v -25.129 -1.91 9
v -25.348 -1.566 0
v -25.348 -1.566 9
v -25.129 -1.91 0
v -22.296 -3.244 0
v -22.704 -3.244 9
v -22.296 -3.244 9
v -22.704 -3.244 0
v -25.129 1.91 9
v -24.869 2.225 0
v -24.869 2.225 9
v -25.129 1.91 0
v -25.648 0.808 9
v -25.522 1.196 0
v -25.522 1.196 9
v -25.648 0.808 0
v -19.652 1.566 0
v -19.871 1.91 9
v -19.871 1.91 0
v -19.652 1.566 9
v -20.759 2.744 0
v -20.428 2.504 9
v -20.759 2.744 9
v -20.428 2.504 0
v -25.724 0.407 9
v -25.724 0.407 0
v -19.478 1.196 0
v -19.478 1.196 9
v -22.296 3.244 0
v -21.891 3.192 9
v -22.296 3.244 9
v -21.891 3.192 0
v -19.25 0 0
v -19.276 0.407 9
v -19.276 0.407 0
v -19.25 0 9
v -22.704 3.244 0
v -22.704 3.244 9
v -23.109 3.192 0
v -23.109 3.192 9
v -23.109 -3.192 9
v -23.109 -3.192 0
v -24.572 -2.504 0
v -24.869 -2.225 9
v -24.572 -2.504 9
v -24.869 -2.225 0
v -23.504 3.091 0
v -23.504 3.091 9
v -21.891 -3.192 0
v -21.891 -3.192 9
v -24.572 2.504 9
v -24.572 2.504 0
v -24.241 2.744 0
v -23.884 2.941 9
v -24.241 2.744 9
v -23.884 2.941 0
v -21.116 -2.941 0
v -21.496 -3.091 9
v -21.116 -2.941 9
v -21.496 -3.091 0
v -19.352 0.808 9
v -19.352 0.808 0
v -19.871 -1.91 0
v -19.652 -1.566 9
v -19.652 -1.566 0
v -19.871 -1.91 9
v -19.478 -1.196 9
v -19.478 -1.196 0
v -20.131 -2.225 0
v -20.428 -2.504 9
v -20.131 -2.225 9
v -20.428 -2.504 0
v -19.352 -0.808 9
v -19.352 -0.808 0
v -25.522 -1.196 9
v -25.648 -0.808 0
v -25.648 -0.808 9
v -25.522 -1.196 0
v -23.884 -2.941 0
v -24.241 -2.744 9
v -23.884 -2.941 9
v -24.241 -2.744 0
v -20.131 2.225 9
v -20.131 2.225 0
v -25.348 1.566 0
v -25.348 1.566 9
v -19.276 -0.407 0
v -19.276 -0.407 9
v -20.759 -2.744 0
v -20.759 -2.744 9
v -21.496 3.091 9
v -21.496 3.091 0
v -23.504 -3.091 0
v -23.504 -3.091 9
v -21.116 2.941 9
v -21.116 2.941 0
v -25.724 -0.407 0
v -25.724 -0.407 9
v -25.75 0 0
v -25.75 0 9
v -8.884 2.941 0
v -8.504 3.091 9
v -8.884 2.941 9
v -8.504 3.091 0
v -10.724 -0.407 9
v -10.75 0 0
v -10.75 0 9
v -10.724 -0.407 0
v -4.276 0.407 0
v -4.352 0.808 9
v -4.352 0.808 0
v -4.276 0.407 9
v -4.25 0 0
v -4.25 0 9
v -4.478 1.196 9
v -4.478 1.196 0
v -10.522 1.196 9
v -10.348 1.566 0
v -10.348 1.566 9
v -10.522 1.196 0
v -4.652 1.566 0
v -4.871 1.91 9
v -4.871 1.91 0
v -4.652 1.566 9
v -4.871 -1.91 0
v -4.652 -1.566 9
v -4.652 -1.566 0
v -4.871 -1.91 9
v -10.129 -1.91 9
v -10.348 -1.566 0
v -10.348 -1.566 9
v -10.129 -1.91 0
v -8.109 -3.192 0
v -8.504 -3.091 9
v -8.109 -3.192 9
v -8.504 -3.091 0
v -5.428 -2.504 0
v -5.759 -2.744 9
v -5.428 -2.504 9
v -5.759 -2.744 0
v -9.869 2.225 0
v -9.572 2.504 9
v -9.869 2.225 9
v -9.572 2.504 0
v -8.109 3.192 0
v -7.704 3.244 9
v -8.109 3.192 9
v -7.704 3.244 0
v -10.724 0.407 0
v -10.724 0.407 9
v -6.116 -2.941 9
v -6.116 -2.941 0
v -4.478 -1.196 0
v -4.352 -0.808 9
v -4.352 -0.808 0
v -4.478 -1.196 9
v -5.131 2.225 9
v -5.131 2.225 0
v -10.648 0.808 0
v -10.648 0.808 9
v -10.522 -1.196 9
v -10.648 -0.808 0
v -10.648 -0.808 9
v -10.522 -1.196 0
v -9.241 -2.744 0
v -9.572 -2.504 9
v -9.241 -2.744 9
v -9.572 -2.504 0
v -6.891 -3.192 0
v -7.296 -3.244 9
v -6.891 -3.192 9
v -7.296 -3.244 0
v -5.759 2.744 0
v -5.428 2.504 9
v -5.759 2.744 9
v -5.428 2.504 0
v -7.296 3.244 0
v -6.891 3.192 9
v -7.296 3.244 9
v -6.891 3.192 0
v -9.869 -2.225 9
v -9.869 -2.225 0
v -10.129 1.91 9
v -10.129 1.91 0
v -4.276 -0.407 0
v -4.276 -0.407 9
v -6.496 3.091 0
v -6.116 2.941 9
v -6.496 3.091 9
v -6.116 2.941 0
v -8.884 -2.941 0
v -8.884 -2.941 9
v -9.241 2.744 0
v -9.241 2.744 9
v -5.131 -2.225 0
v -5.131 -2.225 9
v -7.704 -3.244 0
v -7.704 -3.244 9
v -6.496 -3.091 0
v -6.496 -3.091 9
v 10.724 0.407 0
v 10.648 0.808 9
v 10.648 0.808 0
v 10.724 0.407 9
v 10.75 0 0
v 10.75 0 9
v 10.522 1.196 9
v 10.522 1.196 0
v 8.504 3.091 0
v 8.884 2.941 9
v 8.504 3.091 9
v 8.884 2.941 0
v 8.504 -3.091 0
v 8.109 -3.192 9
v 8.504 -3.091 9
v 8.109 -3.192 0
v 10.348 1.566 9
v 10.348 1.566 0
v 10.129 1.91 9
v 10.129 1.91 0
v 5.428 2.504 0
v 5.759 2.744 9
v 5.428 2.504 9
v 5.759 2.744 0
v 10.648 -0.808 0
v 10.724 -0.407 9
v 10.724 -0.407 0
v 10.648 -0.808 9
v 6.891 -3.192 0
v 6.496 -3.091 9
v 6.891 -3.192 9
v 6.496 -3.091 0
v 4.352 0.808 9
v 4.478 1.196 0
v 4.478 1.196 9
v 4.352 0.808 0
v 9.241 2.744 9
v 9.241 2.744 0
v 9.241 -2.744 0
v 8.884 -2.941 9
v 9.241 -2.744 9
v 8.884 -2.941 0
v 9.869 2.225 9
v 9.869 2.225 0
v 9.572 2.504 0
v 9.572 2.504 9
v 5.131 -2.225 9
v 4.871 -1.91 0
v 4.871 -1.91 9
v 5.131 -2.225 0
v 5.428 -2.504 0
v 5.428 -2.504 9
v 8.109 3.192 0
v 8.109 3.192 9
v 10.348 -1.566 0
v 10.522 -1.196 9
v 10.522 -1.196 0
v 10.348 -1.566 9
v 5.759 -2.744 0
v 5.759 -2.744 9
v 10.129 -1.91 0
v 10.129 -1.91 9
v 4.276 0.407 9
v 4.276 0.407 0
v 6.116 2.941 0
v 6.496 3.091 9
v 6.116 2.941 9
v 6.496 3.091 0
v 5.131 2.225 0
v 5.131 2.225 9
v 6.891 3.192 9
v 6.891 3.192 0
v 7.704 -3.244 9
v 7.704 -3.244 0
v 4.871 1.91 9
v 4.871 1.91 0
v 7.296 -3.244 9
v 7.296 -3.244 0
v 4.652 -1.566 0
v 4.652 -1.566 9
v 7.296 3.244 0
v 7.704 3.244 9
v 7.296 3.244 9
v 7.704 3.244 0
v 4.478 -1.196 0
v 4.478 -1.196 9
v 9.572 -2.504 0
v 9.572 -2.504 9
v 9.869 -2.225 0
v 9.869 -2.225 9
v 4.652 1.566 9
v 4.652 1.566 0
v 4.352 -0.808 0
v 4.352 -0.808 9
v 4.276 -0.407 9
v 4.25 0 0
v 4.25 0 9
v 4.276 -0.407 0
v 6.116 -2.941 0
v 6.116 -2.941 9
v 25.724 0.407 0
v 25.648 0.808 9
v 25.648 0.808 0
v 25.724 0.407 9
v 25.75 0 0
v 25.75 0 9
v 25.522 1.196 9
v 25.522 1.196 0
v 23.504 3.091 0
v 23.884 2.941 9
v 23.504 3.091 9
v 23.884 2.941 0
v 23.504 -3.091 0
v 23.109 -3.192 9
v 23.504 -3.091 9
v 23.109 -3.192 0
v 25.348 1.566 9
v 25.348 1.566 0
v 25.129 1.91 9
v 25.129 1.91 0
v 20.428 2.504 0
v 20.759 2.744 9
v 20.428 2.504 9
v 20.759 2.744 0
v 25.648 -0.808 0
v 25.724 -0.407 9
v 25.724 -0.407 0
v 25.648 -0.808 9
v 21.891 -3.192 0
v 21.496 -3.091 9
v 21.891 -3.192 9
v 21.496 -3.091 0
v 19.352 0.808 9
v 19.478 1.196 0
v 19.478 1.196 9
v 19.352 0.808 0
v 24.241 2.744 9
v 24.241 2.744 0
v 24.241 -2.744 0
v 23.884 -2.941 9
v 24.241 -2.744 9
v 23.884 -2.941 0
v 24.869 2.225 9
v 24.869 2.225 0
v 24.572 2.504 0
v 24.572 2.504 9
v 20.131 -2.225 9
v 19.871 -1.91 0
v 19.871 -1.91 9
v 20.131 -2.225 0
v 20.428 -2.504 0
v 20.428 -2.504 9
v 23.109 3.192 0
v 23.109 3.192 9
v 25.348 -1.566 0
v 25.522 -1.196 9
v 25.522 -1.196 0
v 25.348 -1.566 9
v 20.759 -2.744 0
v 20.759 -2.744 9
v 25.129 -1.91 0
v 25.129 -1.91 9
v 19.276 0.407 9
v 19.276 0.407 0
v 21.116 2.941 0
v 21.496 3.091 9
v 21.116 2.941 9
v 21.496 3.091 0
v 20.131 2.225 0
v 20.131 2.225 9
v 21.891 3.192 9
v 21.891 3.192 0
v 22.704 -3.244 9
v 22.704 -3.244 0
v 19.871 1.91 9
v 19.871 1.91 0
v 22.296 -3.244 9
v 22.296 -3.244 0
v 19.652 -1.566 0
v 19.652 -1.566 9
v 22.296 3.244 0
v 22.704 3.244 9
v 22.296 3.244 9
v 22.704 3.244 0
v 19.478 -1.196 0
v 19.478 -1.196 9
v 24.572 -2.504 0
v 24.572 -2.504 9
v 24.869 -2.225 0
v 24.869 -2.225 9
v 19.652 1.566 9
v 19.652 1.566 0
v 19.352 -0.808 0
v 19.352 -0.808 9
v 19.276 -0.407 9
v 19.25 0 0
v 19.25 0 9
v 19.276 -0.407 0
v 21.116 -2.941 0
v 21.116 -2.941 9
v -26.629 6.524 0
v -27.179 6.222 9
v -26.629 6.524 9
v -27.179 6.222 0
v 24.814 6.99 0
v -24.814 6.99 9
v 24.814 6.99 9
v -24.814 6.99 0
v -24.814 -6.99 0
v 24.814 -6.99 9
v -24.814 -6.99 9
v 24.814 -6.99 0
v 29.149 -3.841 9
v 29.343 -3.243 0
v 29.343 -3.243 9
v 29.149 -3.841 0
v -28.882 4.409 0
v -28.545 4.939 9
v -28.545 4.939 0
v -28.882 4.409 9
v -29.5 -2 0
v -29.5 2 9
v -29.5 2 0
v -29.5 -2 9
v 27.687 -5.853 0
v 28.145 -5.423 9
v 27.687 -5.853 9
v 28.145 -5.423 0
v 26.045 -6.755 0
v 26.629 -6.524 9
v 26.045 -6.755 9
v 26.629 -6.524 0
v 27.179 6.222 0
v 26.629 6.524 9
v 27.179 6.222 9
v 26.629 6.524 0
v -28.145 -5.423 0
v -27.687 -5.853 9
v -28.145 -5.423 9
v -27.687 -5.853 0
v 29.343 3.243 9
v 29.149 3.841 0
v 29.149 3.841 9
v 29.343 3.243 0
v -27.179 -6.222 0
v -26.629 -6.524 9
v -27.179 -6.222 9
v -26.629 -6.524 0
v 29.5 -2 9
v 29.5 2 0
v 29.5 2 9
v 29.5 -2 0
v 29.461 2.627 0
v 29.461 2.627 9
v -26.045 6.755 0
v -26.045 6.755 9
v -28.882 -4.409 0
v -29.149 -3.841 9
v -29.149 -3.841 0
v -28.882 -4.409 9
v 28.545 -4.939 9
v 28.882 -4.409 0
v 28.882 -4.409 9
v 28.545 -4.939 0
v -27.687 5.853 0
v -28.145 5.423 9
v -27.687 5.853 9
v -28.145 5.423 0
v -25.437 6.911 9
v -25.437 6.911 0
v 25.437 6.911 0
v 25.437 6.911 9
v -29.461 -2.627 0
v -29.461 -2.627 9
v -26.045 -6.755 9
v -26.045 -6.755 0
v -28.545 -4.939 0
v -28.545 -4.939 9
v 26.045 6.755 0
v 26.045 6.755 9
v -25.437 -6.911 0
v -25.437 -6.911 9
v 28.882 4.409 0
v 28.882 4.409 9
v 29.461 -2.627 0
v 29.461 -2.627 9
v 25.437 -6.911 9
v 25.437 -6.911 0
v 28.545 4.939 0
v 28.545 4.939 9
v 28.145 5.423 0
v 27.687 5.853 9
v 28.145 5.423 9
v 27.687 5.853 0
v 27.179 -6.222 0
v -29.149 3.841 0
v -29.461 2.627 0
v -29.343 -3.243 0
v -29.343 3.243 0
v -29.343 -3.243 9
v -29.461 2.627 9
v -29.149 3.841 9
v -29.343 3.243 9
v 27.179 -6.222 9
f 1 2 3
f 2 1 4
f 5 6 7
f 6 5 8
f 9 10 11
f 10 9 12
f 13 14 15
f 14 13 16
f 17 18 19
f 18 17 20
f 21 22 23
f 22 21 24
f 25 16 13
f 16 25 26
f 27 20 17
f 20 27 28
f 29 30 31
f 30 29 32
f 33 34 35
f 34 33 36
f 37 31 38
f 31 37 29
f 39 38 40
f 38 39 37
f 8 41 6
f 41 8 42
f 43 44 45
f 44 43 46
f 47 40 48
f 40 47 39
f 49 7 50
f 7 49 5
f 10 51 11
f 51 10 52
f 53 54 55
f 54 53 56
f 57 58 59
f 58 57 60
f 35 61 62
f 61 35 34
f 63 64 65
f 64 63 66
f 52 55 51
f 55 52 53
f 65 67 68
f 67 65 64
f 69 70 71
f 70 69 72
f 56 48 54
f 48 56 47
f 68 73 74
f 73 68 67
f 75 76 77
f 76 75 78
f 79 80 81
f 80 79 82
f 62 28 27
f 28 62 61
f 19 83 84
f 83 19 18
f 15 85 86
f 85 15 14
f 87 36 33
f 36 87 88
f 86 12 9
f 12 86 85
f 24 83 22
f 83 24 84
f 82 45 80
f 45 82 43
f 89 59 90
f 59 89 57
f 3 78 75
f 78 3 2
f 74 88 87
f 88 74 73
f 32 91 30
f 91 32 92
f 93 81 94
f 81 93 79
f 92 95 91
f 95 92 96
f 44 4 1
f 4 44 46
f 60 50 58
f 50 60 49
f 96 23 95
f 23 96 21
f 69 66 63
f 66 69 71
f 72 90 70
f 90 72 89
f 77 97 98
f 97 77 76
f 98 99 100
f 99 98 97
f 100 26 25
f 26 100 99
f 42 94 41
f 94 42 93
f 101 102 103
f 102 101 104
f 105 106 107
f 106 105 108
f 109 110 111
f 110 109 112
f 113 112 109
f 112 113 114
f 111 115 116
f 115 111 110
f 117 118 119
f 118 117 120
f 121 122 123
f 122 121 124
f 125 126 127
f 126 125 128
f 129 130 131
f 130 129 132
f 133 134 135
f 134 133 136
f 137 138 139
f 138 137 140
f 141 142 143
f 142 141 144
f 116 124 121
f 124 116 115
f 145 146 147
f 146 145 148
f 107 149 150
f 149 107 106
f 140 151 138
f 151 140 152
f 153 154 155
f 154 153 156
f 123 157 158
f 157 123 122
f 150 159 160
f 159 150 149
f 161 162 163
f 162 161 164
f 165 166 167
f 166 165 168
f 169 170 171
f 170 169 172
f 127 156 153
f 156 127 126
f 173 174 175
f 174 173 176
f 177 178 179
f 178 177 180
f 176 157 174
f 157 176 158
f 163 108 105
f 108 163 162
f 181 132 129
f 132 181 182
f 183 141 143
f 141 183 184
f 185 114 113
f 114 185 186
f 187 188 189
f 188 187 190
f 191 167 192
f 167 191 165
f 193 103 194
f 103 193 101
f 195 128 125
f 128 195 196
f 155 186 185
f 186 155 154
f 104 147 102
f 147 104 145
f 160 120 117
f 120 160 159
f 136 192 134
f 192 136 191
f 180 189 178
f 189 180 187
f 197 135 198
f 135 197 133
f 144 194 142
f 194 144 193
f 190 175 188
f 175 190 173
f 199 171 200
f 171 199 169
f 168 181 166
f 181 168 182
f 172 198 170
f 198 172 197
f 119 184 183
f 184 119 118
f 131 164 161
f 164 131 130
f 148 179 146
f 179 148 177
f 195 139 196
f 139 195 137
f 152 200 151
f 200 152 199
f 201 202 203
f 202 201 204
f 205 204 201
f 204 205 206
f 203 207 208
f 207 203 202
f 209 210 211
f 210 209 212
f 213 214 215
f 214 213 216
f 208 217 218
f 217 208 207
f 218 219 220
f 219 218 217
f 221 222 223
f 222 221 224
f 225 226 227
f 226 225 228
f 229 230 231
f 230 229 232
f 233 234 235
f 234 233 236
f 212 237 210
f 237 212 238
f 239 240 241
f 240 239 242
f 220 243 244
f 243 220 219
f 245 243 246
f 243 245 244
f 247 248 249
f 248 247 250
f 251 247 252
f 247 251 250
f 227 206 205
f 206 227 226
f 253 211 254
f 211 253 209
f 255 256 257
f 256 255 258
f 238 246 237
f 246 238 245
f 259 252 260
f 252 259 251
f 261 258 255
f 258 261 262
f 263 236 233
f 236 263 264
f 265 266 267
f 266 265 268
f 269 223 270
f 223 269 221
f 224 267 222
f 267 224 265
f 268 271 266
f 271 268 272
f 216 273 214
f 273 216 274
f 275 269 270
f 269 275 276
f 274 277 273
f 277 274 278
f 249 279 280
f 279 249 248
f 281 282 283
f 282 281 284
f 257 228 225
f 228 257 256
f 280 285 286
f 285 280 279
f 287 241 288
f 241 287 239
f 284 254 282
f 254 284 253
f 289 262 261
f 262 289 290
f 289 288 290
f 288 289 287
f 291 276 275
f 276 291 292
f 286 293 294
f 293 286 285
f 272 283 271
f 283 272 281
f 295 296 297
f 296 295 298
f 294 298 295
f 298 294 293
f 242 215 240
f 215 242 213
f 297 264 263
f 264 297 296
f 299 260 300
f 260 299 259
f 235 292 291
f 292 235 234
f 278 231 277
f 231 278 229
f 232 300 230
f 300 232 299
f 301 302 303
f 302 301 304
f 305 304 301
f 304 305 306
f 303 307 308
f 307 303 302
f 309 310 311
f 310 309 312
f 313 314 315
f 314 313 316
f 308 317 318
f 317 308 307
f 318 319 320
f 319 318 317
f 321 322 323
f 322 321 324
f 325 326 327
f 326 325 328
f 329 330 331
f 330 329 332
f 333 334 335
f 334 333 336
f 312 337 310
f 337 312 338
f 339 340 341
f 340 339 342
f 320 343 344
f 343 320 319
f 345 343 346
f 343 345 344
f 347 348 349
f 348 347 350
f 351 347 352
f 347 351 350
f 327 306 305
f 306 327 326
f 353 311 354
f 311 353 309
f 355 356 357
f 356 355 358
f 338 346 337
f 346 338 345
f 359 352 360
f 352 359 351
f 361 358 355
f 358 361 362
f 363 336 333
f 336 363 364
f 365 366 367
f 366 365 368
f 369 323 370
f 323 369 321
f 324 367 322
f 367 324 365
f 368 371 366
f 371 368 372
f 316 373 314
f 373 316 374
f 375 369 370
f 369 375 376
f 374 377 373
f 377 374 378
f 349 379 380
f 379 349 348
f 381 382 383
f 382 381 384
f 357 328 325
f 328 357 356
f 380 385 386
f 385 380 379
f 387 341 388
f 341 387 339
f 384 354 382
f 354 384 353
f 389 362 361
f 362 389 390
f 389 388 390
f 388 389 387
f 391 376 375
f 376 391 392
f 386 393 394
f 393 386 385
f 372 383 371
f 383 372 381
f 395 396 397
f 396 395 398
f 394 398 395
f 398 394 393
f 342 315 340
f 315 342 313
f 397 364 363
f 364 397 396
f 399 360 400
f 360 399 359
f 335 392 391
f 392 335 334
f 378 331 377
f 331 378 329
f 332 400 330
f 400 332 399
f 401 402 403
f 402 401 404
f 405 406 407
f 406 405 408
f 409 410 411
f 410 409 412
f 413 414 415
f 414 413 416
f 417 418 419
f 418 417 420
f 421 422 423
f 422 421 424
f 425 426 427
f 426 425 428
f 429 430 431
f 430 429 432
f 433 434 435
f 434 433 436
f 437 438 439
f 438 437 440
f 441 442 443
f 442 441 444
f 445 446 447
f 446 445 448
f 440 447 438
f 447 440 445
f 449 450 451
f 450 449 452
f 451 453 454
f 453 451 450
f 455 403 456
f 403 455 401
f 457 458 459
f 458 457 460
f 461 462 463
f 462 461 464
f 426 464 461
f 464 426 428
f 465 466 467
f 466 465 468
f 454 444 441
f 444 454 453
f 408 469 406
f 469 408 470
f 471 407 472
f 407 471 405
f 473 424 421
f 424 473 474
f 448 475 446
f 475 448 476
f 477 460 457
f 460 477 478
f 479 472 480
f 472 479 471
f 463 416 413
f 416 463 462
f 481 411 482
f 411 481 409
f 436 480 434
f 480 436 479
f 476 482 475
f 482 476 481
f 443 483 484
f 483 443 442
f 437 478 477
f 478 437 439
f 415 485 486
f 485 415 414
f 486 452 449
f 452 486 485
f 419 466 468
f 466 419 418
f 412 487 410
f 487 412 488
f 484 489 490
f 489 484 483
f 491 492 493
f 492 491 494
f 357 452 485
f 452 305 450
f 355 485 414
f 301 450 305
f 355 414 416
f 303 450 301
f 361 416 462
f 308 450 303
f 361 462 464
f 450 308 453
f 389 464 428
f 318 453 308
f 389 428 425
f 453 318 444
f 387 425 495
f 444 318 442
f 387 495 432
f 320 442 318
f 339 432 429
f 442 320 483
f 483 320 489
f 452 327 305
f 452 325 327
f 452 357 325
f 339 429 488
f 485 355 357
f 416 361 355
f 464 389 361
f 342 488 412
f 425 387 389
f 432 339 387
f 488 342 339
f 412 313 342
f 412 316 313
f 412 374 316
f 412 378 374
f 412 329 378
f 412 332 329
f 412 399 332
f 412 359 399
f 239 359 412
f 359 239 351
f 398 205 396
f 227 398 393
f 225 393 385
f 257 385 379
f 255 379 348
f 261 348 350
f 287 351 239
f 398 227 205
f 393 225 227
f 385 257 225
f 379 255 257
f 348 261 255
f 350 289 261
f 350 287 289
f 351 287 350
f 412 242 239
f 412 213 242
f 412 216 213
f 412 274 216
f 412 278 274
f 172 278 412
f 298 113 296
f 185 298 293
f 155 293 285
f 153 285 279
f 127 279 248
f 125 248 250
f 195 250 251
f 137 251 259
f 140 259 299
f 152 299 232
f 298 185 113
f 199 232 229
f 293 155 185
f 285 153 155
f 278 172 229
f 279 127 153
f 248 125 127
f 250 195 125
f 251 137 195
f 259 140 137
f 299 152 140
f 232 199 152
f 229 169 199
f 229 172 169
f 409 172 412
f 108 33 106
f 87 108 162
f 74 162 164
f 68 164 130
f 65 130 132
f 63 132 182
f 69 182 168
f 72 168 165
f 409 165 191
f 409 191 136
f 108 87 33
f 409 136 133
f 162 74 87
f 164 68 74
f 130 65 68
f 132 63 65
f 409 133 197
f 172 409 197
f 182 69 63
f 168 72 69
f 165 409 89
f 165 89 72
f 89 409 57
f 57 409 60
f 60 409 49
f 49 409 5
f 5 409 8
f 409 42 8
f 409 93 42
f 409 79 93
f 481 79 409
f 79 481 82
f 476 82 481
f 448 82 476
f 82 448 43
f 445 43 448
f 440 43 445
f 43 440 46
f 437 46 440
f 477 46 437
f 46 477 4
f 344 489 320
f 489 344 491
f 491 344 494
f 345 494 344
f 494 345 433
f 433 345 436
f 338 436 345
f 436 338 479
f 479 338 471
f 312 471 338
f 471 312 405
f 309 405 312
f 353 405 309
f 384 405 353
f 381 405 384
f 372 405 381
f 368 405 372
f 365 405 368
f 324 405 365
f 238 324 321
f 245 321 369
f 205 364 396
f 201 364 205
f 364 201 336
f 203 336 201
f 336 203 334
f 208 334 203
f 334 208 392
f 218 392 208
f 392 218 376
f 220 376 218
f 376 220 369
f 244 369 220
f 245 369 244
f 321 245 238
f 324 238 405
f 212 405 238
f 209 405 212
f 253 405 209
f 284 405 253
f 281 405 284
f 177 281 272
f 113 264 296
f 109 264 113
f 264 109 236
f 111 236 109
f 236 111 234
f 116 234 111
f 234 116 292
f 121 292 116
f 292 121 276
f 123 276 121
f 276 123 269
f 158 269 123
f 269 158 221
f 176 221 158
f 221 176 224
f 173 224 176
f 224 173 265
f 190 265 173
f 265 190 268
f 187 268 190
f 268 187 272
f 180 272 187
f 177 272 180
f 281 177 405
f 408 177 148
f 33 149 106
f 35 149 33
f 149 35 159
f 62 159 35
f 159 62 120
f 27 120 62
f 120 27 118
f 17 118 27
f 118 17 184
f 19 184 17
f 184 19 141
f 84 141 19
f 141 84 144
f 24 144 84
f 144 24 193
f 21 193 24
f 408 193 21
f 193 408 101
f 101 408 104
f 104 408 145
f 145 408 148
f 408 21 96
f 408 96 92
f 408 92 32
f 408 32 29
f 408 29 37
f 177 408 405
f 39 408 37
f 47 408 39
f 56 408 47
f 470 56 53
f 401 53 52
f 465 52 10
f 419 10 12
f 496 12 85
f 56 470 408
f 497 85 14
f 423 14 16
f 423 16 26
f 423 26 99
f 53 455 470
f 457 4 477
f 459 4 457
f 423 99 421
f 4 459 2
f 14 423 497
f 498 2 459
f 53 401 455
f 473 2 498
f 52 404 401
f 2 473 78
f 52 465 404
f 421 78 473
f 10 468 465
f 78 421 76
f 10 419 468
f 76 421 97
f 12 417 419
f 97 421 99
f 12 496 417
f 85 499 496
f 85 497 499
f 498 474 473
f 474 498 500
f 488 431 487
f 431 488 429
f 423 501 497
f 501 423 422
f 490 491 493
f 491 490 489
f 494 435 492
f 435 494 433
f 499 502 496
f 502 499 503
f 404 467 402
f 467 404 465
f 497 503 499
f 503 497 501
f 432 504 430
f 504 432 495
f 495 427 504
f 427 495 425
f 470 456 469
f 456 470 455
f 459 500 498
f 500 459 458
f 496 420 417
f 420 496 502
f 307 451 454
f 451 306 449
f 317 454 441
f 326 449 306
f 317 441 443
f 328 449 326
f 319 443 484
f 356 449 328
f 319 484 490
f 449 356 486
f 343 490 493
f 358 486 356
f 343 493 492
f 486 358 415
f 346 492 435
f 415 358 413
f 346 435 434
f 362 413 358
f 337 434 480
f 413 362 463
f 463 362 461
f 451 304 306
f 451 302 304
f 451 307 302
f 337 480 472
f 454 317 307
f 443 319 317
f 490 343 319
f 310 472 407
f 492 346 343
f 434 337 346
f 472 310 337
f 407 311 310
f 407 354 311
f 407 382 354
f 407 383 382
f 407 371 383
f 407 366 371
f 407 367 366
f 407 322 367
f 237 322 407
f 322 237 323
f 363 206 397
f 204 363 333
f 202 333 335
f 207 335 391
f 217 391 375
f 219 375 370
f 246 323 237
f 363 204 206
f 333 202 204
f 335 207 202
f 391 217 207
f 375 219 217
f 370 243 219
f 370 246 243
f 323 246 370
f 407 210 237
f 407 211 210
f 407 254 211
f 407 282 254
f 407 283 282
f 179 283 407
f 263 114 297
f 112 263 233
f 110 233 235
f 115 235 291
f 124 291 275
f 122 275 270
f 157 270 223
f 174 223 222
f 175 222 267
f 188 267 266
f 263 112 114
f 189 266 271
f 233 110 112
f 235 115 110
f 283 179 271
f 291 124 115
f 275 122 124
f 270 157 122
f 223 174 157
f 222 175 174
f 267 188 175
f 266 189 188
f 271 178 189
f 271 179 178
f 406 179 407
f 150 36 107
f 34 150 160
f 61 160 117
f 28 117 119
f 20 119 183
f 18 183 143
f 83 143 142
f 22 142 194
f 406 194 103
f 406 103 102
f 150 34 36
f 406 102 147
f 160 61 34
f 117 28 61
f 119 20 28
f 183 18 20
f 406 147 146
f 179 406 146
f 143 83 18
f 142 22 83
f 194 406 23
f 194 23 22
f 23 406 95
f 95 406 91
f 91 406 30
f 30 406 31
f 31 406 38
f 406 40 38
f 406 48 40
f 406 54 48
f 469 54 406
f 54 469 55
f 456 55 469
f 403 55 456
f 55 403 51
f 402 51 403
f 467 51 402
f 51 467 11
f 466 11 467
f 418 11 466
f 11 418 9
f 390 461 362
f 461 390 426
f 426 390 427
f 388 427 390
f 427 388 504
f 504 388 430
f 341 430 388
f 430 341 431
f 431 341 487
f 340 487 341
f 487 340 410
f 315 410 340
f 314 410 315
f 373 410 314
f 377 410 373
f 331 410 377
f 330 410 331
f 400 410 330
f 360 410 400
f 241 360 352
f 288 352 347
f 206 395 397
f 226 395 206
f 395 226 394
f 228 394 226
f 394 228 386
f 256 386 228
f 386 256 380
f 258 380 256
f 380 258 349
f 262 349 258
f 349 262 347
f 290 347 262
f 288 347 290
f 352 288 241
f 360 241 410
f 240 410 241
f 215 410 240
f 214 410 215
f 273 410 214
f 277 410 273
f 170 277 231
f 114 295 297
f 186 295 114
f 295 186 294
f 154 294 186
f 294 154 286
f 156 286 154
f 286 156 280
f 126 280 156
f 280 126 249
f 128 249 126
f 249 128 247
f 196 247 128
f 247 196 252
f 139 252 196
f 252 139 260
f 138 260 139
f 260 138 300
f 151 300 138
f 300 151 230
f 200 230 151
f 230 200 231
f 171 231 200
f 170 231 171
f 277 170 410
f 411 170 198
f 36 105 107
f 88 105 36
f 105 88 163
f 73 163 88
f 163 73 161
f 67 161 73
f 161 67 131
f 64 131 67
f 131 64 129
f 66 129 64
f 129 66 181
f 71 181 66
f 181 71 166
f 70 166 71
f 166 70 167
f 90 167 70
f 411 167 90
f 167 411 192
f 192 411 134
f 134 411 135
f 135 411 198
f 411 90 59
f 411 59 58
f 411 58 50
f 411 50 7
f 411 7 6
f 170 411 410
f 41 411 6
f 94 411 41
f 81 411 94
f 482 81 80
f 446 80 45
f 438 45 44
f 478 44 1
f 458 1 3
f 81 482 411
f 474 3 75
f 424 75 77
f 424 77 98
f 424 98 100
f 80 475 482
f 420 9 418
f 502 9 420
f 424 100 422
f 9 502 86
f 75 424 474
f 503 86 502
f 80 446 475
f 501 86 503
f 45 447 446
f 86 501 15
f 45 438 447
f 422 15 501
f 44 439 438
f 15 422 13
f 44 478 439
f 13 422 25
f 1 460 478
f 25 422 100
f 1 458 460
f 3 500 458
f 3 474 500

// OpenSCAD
$fn = 50;


difference() {
	union() {
		hull() {
			translate(v = [-24.5000000000, 2.0000000000, 0]) {
				cylinder(h = 9, r = 5);
			}
			translate(v = [24.5000000000, 2.0000000000, 0]) {
				cylinder(h = 9, r = 5);
			}
			translate(v = [-24.5000000000, -2.0000000000, 0]) {
				cylinder(h = 9, r = 5);
			}
			translate(v = [24.5000000000, -2.0000000000, 0]) {
				cylinder(h = 9, r = 5);
			}
		}
	}
	union() {
		translate(v = [-22.5000000000, 0.0000000000, -100.0000000000]) {
			cylinder(h = 200, r = 3.2500000000);
		}
		translate(v = [-7.5000000000, 0.0000000000, -100.0000000000]) {
			cylinder(h = 200, r = 3.2500000000);
		}
		translate(v = [7.5000000000, 0.0000000000, -100.0000000000]) {
			cylinder(h = 200, r = 3.2500000000);
		}
		translate(v = [22.5000000000, 0.0000000000, -100.0000000000]) {
			cylinder(h = 200, r = 3.2500000000);
		}
	}
}
